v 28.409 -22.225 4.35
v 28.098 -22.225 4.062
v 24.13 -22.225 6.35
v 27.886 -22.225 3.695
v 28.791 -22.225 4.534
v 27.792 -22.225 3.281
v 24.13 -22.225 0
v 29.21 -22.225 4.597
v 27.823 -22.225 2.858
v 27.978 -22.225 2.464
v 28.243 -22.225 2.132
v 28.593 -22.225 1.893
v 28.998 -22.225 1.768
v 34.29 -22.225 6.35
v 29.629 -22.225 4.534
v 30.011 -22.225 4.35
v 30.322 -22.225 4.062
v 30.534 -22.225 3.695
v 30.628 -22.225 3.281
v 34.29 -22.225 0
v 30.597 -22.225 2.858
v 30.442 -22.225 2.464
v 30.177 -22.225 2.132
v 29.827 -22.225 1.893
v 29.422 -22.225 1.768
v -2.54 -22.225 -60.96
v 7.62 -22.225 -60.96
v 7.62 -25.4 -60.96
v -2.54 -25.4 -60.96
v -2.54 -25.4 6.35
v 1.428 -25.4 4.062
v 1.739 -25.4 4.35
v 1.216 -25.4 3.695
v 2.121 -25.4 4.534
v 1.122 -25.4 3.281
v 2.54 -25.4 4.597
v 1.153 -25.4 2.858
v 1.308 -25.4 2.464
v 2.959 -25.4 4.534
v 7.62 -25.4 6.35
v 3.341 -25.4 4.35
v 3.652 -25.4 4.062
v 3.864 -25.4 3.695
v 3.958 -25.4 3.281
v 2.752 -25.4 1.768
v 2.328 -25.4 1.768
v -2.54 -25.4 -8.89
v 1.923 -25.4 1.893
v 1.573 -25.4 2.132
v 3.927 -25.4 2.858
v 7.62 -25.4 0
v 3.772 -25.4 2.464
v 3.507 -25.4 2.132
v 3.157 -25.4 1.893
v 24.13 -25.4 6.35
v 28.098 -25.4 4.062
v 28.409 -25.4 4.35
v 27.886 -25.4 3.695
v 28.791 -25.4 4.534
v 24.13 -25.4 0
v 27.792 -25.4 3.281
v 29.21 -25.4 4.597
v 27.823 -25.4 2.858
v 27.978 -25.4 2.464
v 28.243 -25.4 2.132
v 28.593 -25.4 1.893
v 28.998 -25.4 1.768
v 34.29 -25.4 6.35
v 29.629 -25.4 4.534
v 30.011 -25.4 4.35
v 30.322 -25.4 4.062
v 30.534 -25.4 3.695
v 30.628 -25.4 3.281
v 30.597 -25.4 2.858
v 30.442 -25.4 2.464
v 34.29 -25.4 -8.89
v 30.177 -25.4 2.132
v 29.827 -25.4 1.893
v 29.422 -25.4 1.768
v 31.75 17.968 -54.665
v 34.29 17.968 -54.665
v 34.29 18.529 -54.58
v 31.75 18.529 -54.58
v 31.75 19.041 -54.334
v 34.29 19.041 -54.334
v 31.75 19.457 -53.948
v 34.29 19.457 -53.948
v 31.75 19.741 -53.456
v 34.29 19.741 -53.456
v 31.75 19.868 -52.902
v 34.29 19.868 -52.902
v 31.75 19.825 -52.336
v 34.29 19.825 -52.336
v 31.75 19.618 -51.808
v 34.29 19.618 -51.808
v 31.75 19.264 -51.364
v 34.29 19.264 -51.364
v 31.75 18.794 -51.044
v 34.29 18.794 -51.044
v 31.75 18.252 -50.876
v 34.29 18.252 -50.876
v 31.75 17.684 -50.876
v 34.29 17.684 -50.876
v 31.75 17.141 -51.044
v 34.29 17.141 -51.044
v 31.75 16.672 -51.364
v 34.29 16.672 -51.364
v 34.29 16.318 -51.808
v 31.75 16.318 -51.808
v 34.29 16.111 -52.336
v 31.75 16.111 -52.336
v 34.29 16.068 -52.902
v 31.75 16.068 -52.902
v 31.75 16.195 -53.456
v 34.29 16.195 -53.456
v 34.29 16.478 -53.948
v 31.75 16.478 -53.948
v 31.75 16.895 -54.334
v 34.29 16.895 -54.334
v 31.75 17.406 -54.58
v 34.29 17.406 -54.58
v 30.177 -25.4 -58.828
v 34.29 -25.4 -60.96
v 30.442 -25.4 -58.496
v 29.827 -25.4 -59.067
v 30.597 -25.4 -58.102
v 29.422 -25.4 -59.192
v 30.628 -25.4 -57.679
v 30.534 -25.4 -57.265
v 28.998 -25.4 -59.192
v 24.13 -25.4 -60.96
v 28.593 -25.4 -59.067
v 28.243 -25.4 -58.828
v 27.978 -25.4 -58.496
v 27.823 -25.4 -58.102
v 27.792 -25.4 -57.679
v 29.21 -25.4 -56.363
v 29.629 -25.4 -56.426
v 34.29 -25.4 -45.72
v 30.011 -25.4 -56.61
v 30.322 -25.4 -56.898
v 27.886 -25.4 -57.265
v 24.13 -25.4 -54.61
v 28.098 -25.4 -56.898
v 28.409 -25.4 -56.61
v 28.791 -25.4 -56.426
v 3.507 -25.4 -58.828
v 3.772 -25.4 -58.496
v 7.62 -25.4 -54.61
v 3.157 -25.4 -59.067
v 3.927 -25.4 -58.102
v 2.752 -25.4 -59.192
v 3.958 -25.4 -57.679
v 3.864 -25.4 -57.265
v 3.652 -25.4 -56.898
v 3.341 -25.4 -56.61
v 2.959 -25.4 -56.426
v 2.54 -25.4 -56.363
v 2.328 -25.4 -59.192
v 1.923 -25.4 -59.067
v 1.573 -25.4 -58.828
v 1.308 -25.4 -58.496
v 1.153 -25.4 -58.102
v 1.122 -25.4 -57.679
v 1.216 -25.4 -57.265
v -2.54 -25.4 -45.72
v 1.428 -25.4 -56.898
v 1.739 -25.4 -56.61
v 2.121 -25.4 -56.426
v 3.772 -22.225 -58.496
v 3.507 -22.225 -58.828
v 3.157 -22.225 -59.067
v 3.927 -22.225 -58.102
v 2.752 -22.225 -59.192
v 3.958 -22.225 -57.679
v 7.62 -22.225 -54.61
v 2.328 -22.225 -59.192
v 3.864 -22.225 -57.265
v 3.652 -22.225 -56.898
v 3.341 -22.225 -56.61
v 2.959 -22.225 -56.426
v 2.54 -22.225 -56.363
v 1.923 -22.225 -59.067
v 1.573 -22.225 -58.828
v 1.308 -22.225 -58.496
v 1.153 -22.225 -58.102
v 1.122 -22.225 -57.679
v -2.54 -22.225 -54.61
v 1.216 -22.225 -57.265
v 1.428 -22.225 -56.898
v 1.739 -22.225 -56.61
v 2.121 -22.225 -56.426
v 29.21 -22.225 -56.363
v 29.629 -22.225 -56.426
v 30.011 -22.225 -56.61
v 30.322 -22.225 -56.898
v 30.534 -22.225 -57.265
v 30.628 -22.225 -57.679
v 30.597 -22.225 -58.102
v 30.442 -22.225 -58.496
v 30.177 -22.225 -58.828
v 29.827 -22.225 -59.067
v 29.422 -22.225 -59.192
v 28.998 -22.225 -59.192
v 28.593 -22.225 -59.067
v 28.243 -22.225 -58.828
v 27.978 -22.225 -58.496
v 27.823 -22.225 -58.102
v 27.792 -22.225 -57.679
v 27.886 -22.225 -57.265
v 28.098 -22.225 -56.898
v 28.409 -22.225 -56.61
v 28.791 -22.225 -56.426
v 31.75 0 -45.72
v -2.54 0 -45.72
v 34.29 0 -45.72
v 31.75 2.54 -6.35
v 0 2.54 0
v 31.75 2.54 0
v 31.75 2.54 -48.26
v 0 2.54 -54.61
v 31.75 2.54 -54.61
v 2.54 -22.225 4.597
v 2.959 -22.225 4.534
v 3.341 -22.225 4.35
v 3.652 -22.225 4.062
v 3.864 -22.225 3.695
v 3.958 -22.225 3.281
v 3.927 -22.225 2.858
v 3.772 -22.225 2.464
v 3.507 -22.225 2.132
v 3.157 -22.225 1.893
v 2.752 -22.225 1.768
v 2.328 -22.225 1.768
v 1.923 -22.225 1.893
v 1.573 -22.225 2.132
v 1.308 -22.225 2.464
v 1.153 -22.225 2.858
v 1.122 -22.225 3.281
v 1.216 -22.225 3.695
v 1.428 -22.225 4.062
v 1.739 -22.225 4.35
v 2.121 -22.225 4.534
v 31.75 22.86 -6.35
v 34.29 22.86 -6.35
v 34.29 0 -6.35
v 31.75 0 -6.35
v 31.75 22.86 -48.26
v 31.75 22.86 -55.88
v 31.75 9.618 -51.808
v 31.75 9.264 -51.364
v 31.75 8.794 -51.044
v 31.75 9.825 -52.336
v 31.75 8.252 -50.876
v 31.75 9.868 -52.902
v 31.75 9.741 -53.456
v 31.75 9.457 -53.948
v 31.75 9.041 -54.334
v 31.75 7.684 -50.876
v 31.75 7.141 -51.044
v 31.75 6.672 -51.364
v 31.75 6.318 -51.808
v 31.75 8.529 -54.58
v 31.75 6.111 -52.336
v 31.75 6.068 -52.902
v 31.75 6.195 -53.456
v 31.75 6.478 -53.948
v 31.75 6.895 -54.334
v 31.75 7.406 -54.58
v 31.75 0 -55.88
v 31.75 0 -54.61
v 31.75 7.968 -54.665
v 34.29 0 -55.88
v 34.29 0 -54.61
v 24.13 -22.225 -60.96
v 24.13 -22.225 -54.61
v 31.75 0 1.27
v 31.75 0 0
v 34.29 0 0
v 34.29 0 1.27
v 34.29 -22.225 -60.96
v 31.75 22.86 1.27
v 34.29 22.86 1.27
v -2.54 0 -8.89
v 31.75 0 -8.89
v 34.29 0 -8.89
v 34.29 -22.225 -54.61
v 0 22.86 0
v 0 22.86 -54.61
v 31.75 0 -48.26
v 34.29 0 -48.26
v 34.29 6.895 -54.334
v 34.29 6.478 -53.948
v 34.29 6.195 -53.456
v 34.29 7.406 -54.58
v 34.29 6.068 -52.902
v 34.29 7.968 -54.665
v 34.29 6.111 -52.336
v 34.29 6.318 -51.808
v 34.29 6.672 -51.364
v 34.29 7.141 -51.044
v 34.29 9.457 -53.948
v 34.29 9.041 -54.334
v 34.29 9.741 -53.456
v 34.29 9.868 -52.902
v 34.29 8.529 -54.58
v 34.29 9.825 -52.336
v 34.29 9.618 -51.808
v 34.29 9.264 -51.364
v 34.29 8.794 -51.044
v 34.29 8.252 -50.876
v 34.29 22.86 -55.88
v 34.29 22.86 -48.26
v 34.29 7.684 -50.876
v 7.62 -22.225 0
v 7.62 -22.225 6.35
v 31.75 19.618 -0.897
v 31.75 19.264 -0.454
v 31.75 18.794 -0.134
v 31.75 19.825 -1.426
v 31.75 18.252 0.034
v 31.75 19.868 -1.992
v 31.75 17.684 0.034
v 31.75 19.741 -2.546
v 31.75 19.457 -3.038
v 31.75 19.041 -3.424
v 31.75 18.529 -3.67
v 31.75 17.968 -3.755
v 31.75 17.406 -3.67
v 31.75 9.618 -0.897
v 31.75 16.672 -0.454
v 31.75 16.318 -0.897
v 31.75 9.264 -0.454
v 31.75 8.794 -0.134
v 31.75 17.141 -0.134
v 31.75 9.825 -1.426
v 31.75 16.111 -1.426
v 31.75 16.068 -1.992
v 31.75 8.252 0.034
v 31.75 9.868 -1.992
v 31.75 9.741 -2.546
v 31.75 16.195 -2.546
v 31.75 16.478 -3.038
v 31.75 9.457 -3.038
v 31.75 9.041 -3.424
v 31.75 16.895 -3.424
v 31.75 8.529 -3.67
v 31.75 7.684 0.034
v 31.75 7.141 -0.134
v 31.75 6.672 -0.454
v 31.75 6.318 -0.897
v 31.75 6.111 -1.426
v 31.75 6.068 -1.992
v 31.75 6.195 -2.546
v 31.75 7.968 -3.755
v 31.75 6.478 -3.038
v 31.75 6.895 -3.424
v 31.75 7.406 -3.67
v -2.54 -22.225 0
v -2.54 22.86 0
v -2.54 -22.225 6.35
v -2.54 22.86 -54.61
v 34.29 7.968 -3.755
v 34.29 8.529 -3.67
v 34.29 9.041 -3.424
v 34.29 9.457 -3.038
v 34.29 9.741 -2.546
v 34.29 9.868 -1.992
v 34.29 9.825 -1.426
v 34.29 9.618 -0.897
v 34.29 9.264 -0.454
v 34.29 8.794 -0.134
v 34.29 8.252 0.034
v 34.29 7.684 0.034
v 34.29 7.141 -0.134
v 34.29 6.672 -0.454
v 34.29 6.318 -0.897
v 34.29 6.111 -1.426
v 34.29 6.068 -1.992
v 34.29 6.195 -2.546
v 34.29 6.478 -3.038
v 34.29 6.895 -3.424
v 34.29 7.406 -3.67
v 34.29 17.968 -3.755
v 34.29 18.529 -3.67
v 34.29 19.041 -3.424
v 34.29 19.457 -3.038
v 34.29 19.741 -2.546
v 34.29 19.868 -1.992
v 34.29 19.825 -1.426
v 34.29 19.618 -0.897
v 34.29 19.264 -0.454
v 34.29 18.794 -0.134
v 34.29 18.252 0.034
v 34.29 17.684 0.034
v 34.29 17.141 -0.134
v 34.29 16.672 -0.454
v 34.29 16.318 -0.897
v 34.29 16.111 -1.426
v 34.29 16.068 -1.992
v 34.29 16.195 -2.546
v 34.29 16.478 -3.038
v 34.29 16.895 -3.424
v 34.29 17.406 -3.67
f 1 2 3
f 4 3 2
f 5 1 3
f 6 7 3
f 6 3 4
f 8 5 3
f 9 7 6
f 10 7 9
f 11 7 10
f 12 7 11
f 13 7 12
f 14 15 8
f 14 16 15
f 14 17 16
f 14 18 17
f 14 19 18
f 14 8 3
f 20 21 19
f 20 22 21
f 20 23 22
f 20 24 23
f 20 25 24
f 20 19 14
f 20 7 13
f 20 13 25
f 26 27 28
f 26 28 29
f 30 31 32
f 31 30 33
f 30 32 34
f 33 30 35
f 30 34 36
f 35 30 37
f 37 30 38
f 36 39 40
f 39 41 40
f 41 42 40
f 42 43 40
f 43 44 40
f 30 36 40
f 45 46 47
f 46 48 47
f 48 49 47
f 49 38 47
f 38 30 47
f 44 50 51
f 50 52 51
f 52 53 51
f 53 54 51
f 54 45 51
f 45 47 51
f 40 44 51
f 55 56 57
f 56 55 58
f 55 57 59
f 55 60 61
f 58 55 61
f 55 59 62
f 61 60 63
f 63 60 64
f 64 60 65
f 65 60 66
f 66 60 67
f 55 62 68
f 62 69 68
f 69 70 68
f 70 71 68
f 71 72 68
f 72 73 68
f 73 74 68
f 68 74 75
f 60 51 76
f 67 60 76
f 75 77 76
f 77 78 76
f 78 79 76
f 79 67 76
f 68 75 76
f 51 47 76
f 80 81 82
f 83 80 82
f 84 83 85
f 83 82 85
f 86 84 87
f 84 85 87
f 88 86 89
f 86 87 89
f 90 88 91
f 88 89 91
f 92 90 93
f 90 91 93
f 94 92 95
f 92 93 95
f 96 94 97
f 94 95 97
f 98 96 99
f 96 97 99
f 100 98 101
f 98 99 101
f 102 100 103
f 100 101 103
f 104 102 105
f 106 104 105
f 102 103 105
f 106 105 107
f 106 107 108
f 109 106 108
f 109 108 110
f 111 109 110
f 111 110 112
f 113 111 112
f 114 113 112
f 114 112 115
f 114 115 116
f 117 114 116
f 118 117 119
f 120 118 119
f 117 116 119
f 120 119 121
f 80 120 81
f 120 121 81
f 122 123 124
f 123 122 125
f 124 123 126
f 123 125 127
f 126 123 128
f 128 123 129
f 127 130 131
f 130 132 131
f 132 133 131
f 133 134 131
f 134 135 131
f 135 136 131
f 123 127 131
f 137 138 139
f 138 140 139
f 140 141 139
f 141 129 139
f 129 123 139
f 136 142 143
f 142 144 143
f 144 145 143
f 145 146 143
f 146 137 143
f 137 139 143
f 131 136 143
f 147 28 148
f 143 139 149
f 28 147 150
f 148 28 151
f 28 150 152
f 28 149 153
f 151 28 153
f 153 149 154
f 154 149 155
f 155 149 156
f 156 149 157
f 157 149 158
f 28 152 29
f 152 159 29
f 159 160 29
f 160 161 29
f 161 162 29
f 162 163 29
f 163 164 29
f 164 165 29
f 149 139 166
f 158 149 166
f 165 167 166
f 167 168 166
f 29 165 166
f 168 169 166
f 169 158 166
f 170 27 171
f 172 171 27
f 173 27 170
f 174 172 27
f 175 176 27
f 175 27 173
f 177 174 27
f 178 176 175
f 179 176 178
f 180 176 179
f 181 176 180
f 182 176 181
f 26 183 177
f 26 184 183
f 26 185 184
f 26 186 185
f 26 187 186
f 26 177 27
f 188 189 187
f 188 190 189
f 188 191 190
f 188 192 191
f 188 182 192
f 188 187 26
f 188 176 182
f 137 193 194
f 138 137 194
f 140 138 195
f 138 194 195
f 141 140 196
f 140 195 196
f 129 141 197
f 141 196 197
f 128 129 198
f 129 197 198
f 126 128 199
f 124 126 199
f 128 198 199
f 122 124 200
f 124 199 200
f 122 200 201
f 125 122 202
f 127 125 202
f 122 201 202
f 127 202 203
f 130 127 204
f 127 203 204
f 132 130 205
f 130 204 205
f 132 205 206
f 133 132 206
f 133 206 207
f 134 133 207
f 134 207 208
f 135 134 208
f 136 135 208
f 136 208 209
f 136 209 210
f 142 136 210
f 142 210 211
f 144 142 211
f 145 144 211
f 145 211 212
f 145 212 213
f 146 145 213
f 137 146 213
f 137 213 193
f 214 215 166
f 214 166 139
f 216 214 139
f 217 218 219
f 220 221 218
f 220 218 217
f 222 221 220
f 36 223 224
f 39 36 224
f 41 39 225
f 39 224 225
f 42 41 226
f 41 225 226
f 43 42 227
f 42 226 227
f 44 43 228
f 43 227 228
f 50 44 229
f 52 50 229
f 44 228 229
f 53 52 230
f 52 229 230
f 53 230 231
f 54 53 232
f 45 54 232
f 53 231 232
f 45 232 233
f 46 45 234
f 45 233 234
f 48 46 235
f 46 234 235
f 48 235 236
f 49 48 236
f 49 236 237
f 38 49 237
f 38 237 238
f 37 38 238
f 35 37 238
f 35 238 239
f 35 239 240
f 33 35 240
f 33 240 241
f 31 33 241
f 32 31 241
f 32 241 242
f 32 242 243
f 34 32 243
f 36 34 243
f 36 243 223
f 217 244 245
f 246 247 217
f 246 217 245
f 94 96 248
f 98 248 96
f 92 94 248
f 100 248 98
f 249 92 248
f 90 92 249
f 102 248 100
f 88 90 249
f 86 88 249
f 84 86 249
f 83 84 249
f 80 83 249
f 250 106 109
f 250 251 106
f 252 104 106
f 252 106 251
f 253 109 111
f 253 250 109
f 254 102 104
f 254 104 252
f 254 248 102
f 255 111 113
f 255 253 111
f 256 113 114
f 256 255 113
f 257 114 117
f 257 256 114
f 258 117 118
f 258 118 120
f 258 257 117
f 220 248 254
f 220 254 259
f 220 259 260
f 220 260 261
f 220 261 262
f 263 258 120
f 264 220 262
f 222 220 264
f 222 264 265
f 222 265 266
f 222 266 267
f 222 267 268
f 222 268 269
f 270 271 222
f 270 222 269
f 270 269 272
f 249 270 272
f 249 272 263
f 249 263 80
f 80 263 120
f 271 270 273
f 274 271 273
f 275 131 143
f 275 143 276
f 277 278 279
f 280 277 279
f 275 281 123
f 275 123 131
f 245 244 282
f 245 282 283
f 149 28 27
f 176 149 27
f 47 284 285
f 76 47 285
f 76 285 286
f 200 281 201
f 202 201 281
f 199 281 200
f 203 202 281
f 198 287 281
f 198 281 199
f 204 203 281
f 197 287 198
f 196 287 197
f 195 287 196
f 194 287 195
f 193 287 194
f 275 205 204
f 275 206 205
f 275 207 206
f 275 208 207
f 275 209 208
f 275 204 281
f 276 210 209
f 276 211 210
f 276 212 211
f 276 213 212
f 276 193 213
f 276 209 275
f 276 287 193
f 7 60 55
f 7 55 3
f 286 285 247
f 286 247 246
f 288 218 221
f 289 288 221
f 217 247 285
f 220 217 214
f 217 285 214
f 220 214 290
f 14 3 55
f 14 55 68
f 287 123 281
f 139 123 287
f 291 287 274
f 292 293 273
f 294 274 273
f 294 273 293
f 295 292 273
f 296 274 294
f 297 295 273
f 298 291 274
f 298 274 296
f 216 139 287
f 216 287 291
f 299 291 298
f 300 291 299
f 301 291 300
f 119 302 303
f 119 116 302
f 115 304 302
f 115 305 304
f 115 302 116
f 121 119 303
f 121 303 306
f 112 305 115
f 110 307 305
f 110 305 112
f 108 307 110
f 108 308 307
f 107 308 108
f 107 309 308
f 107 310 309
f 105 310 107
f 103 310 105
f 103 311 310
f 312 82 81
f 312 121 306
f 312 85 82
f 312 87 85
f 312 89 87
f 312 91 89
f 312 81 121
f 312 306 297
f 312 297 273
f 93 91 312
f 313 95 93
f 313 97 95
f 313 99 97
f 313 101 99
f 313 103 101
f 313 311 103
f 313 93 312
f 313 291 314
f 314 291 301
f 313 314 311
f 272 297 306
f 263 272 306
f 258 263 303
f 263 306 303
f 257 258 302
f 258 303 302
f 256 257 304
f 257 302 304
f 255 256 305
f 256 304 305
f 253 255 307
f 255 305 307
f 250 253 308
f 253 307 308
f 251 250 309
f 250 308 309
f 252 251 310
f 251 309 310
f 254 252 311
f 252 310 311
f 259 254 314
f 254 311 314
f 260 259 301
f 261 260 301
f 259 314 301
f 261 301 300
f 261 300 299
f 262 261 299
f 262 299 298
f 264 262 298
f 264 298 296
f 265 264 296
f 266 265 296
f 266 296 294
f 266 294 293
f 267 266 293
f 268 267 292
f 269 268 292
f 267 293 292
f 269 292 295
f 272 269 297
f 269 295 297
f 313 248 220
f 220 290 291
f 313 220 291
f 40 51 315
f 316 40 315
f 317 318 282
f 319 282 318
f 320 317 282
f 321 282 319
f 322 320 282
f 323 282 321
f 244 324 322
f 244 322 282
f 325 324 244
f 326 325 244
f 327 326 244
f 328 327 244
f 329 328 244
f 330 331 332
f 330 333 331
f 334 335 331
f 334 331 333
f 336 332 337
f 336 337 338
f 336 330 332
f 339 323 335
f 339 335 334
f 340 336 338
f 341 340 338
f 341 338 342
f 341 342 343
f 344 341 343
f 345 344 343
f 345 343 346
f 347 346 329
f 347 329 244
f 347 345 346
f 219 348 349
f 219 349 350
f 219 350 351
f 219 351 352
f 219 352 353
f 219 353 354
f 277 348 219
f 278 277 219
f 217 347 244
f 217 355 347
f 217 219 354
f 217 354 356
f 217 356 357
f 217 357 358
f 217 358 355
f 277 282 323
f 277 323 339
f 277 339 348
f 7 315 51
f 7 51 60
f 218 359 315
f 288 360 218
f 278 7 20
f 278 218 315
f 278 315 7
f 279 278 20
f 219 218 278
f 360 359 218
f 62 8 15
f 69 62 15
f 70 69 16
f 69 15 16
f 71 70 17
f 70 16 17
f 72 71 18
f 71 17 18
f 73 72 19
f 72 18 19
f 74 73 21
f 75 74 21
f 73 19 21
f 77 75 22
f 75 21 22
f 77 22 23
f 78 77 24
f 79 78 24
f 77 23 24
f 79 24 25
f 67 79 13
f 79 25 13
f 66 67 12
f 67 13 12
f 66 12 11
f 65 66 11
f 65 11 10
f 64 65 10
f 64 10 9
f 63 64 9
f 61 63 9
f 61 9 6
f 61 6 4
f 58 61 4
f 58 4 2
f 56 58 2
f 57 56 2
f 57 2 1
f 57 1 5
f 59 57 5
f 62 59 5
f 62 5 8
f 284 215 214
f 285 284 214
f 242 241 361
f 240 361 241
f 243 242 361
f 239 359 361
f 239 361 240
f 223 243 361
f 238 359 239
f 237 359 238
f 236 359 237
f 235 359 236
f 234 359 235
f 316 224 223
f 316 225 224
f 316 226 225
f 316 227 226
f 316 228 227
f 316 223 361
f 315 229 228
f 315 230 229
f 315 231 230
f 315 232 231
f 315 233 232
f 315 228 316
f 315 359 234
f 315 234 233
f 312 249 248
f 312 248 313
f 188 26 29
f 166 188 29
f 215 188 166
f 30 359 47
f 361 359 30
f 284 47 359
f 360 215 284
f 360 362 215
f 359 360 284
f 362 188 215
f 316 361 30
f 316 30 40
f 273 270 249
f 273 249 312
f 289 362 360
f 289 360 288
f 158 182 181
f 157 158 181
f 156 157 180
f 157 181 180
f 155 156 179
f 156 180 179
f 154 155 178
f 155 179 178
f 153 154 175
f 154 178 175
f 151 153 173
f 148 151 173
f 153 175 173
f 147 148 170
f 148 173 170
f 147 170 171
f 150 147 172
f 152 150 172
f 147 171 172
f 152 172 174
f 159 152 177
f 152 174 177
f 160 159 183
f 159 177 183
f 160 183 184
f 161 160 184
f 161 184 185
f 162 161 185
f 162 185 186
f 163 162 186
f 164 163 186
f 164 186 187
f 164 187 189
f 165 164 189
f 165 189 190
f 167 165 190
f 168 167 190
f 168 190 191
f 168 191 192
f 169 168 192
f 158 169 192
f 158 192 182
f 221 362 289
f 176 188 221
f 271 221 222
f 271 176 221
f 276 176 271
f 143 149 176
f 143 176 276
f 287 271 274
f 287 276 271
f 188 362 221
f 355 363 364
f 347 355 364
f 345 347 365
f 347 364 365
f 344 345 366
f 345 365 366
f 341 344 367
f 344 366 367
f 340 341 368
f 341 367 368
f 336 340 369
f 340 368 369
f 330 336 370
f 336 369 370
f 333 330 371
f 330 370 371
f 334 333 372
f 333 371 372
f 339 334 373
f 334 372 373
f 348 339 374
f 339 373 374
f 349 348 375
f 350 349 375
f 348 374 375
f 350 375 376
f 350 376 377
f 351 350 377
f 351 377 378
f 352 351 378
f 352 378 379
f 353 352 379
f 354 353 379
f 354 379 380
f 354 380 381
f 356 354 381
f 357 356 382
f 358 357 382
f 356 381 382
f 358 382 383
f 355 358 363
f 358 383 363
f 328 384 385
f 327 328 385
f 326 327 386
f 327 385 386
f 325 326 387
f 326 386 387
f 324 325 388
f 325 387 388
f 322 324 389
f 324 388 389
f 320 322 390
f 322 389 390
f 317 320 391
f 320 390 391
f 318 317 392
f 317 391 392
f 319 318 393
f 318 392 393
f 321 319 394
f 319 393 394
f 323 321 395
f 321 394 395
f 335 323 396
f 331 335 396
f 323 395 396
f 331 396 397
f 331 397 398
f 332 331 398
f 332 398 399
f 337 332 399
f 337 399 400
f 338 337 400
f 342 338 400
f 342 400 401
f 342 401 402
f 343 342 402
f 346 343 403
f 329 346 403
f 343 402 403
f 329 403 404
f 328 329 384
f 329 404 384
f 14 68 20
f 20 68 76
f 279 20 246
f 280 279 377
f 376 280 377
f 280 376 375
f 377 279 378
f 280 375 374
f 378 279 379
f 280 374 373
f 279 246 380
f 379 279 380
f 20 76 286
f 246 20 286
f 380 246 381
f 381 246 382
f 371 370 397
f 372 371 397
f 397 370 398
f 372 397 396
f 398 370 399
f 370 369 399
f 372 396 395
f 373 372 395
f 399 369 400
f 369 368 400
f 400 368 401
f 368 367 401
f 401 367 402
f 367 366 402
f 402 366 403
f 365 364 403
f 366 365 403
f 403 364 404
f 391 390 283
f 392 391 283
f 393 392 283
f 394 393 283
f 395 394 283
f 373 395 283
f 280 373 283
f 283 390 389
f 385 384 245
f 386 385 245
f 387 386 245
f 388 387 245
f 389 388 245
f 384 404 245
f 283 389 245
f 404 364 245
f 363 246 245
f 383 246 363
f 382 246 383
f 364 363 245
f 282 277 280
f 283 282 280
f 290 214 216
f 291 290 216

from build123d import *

# Parameters (mm, degrees)
SKETCH1_W           = 31.75
SKETCH1_H           = 54.61
BOSS_EXTRUDE1_DEPTH = 2.54
SKETCH2_W           = 2.54
SKETCH2_H           = 7.62
SKETCH2_H_2         = 54.61
BOSS_EXTRUDE2_DEPTH = 22.86
SKETCH3_W           = 36.83
SKETCH3_H           = 8.89
BOSS_EXTRUDE3_DEPTH = 25.4
SKETCH4_R           = 1.905
CUT_EXTRUDE1_DEPTH  = 2.54
SKETCH5_W           = 10.16
SKETCH5_H           = 3.175
BOSS_EXTRUDE4_DEPTH = 6.35
SKETCH6_W           = 10.16
SKETCH6_H           = 3.175
BOSS_EXTRUDE5_DEPTH = 6.35
SKETCH7_R           = 1.4224
CUT_EXTRUDE2_DEPTH  = 84.214078887


with BuildPart() as part:
    # Sketch1 → Boss-Extrude1 (new body)
    with BuildSketch(Plane(origin=(0, 0, 0), x_dir=(1, 0, 0), z_dir=(0, 1, 0))):
        with Locations((15.875, 27.305)):
            Rectangle(SKETCH1_W, SKETCH1_H)
    extrude(amount=BOSS_EXTRUDE1_DEPTH)

    # Sketch2 → Boss-Extrude2 (add)
    with BuildSketch(Plane(origin=(0, 0, 0), x_dir=(1, 0, 0), z_dir=(0, 1, 0))):
        with Locations((33.02, 2.54)):
            Rectangle(SKETCH2_W, SKETCH2_H)
        with Locations((33.02, 52.07)):
            Rectangle(SKETCH2_W, SKETCH2_H)
        with Locations((-1.27, 27.305)):
            Rectangle(SKETCH2_W, SKETCH2_H_2)
    extrude(amount=BOSS_EXTRUDE2_DEPTH)

    # Sketch3 → Boss-Extrude3 (add)
    with BuildSketch(Plane.XZ):
        with Locations((15.875, -4.445)):
            Rectangle(SKETCH3_W, SKETCH3_H)
        with Locations((15.875, -50.165)):
            Rectangle(SKETCH3_W, SKETCH3_H)
    extrude(amount=BOSS_EXTRUDE3_DEPTH)

    # Sketch4 → Cut-Extrude1 (cut)
    with BuildSketch(Plane(origin=(34.29, 0, 0), x_dir=(0, 0, -1), z_dir=(1, 0, 0))):
        with Locations((1.85, 17.967840319)):
            Circle(SKETCH4_R)
        with Locations((1.85, 7.967840319)):
            Circle(SKETCH4_R)
        with Locations((52.76, 17.967840319)):
            Circle(SKETCH4_R)
        with Locations((52.76, 7.967840319)):
            Circle(SKETCH4_R)
    extrude(amount=-CUT_EXTRUDE1_DEPTH, mode=Mode.SUBTRACT)

    # Sketch5 → Boss-Extrude4 (add)
    with BuildSketch(Plane(origin=(0, 0, -54.61), x_dir=(-1, 0, 0), z_dir=(0, 0, -1))):
        with Locations((-29.21, -23.8125)):
            Rectangle(SKETCH5_W, SKETCH5_H)
        with Locations((-2.54, -23.8125)):
            Rectangle(SKETCH5_W, SKETCH5_H)
    extrude(amount=BOSS_EXTRUDE4_DEPTH)

    # Sketch6 → Boss-Extrude5 (add)
    with BuildSketch(Plane.XY):
        with Locations((29.21, -23.8125)):
            Rectangle(SKETCH6_W, SKETCH6_H)
        with Locations((2.54, -23.8125)):
            Rectangle(SKETCH6_W, SKETCH6_H)
    extrude(amount=BOSS_EXTRUDE5_DEPTH)

    # Sketch7 → Cut-Extrude2 (cut, through all)
    with BuildSketch(Plane(origin=(0, -22.225, 0), x_dir=(1, 0, 0), z_dir=(0, 1, 0))):
        with Locations(Location((29.21, 57.785, 0), (0, 0, 270))):
            Circle(SKETCH7_R)
        with Locations(Location((2.54, 57.785, 0), (0, 0, 270))):
            Circle(SKETCH7_R)
        with Locations(Location((2.54, -3.175, 0), (0, 0, 270))):
            Circle(SKETCH7_R)
        with Locations(Location((29.21, -3.175, 0), (0, 0, 270))):
            Circle(SKETCH7_R)
    extrude(amount=-CUT_EXTRUDE2_DEPTH, mode=Mode.SUBTRACT)


solid = part.part
